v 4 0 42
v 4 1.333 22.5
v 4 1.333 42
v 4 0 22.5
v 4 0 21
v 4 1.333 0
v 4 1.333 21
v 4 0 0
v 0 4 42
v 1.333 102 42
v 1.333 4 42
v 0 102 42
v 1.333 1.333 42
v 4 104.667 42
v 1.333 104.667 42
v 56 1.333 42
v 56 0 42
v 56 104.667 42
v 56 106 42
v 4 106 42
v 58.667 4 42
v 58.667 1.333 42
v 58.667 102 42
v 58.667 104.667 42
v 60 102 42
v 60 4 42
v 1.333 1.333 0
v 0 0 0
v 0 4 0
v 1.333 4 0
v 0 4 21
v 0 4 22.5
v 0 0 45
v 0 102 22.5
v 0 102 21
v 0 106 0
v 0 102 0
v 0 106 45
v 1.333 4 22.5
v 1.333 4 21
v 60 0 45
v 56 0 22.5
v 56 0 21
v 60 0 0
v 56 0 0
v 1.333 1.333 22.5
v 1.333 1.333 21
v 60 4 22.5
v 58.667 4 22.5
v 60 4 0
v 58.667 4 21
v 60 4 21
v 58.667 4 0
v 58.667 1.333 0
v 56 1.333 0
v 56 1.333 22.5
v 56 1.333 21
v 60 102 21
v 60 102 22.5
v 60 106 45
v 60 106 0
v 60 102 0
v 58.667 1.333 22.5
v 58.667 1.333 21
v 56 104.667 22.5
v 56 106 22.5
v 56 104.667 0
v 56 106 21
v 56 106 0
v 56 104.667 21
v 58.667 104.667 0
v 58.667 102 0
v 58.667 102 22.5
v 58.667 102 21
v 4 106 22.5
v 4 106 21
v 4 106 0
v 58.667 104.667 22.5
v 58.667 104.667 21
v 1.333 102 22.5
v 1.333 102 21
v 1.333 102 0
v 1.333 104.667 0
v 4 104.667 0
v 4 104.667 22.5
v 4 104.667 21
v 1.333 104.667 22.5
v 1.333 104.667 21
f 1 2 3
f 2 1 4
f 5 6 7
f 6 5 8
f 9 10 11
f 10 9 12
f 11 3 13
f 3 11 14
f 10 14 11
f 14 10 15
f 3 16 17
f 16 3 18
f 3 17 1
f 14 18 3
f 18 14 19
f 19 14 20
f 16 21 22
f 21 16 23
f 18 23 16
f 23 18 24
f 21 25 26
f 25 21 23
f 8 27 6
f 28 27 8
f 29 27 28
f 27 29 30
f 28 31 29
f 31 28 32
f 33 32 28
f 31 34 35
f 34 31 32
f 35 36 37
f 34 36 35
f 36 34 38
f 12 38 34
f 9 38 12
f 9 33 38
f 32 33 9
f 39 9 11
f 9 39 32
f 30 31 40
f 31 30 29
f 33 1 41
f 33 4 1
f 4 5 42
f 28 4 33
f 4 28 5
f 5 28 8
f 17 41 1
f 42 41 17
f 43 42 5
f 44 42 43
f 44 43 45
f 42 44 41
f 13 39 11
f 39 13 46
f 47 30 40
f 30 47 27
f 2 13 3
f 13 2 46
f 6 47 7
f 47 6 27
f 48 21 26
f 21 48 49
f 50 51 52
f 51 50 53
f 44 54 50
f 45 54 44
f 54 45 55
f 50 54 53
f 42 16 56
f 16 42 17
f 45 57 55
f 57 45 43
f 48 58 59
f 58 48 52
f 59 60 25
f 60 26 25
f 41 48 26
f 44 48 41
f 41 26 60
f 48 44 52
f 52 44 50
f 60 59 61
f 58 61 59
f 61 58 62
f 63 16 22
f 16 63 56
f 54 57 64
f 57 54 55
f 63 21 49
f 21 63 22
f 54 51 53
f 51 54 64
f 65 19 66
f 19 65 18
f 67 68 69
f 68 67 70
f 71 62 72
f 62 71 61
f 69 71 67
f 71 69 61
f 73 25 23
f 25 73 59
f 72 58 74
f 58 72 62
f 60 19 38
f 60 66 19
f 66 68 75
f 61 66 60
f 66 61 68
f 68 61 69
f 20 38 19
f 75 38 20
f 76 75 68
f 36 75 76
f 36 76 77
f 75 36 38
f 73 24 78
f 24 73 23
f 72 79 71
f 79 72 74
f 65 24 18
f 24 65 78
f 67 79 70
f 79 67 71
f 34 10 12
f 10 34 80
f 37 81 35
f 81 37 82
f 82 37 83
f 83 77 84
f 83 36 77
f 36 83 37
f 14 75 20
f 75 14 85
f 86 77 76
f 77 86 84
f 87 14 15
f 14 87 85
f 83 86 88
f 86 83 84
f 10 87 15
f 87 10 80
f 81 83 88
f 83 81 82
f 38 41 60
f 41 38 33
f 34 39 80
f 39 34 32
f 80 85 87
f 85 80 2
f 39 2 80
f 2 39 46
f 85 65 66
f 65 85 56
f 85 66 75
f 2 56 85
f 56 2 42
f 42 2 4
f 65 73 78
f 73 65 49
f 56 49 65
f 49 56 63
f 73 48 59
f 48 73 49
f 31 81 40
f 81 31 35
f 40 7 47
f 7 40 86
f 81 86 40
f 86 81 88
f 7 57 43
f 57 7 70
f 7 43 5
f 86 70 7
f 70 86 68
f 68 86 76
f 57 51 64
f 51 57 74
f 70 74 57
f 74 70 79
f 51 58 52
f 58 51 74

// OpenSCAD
table_width = 60;
table_length = 106;
table_height = 45;

plate_height = 1.5;
leg_width = 4;

bottom_offset = 21;

module leg() {
  difference() {
    cube([leg_width, leg_width, table_height - 2*plate_height]);
    translate([leg_width / 3, leg_width / 3, 0])
      cube([leg_width, leg_width, table_height - 2*plate_height]);
  }
}

translate([0, 0, table_height - 2*plate_height])
  cube([table_width, table_length, 2*plate_height]);

translate([0, 0, bottom_offset])
  cube([table_width, table_length, plate_height]);

leg();

translate([table_width, 0, 0])
  rotate([0, 0, 90])
    leg();

translate([table_width, table_length, 0])
  rotate([0, 0, 180])
    leg();

translate([0, table_length, 0])
  rotate([0, 0, 270])
    leg();
